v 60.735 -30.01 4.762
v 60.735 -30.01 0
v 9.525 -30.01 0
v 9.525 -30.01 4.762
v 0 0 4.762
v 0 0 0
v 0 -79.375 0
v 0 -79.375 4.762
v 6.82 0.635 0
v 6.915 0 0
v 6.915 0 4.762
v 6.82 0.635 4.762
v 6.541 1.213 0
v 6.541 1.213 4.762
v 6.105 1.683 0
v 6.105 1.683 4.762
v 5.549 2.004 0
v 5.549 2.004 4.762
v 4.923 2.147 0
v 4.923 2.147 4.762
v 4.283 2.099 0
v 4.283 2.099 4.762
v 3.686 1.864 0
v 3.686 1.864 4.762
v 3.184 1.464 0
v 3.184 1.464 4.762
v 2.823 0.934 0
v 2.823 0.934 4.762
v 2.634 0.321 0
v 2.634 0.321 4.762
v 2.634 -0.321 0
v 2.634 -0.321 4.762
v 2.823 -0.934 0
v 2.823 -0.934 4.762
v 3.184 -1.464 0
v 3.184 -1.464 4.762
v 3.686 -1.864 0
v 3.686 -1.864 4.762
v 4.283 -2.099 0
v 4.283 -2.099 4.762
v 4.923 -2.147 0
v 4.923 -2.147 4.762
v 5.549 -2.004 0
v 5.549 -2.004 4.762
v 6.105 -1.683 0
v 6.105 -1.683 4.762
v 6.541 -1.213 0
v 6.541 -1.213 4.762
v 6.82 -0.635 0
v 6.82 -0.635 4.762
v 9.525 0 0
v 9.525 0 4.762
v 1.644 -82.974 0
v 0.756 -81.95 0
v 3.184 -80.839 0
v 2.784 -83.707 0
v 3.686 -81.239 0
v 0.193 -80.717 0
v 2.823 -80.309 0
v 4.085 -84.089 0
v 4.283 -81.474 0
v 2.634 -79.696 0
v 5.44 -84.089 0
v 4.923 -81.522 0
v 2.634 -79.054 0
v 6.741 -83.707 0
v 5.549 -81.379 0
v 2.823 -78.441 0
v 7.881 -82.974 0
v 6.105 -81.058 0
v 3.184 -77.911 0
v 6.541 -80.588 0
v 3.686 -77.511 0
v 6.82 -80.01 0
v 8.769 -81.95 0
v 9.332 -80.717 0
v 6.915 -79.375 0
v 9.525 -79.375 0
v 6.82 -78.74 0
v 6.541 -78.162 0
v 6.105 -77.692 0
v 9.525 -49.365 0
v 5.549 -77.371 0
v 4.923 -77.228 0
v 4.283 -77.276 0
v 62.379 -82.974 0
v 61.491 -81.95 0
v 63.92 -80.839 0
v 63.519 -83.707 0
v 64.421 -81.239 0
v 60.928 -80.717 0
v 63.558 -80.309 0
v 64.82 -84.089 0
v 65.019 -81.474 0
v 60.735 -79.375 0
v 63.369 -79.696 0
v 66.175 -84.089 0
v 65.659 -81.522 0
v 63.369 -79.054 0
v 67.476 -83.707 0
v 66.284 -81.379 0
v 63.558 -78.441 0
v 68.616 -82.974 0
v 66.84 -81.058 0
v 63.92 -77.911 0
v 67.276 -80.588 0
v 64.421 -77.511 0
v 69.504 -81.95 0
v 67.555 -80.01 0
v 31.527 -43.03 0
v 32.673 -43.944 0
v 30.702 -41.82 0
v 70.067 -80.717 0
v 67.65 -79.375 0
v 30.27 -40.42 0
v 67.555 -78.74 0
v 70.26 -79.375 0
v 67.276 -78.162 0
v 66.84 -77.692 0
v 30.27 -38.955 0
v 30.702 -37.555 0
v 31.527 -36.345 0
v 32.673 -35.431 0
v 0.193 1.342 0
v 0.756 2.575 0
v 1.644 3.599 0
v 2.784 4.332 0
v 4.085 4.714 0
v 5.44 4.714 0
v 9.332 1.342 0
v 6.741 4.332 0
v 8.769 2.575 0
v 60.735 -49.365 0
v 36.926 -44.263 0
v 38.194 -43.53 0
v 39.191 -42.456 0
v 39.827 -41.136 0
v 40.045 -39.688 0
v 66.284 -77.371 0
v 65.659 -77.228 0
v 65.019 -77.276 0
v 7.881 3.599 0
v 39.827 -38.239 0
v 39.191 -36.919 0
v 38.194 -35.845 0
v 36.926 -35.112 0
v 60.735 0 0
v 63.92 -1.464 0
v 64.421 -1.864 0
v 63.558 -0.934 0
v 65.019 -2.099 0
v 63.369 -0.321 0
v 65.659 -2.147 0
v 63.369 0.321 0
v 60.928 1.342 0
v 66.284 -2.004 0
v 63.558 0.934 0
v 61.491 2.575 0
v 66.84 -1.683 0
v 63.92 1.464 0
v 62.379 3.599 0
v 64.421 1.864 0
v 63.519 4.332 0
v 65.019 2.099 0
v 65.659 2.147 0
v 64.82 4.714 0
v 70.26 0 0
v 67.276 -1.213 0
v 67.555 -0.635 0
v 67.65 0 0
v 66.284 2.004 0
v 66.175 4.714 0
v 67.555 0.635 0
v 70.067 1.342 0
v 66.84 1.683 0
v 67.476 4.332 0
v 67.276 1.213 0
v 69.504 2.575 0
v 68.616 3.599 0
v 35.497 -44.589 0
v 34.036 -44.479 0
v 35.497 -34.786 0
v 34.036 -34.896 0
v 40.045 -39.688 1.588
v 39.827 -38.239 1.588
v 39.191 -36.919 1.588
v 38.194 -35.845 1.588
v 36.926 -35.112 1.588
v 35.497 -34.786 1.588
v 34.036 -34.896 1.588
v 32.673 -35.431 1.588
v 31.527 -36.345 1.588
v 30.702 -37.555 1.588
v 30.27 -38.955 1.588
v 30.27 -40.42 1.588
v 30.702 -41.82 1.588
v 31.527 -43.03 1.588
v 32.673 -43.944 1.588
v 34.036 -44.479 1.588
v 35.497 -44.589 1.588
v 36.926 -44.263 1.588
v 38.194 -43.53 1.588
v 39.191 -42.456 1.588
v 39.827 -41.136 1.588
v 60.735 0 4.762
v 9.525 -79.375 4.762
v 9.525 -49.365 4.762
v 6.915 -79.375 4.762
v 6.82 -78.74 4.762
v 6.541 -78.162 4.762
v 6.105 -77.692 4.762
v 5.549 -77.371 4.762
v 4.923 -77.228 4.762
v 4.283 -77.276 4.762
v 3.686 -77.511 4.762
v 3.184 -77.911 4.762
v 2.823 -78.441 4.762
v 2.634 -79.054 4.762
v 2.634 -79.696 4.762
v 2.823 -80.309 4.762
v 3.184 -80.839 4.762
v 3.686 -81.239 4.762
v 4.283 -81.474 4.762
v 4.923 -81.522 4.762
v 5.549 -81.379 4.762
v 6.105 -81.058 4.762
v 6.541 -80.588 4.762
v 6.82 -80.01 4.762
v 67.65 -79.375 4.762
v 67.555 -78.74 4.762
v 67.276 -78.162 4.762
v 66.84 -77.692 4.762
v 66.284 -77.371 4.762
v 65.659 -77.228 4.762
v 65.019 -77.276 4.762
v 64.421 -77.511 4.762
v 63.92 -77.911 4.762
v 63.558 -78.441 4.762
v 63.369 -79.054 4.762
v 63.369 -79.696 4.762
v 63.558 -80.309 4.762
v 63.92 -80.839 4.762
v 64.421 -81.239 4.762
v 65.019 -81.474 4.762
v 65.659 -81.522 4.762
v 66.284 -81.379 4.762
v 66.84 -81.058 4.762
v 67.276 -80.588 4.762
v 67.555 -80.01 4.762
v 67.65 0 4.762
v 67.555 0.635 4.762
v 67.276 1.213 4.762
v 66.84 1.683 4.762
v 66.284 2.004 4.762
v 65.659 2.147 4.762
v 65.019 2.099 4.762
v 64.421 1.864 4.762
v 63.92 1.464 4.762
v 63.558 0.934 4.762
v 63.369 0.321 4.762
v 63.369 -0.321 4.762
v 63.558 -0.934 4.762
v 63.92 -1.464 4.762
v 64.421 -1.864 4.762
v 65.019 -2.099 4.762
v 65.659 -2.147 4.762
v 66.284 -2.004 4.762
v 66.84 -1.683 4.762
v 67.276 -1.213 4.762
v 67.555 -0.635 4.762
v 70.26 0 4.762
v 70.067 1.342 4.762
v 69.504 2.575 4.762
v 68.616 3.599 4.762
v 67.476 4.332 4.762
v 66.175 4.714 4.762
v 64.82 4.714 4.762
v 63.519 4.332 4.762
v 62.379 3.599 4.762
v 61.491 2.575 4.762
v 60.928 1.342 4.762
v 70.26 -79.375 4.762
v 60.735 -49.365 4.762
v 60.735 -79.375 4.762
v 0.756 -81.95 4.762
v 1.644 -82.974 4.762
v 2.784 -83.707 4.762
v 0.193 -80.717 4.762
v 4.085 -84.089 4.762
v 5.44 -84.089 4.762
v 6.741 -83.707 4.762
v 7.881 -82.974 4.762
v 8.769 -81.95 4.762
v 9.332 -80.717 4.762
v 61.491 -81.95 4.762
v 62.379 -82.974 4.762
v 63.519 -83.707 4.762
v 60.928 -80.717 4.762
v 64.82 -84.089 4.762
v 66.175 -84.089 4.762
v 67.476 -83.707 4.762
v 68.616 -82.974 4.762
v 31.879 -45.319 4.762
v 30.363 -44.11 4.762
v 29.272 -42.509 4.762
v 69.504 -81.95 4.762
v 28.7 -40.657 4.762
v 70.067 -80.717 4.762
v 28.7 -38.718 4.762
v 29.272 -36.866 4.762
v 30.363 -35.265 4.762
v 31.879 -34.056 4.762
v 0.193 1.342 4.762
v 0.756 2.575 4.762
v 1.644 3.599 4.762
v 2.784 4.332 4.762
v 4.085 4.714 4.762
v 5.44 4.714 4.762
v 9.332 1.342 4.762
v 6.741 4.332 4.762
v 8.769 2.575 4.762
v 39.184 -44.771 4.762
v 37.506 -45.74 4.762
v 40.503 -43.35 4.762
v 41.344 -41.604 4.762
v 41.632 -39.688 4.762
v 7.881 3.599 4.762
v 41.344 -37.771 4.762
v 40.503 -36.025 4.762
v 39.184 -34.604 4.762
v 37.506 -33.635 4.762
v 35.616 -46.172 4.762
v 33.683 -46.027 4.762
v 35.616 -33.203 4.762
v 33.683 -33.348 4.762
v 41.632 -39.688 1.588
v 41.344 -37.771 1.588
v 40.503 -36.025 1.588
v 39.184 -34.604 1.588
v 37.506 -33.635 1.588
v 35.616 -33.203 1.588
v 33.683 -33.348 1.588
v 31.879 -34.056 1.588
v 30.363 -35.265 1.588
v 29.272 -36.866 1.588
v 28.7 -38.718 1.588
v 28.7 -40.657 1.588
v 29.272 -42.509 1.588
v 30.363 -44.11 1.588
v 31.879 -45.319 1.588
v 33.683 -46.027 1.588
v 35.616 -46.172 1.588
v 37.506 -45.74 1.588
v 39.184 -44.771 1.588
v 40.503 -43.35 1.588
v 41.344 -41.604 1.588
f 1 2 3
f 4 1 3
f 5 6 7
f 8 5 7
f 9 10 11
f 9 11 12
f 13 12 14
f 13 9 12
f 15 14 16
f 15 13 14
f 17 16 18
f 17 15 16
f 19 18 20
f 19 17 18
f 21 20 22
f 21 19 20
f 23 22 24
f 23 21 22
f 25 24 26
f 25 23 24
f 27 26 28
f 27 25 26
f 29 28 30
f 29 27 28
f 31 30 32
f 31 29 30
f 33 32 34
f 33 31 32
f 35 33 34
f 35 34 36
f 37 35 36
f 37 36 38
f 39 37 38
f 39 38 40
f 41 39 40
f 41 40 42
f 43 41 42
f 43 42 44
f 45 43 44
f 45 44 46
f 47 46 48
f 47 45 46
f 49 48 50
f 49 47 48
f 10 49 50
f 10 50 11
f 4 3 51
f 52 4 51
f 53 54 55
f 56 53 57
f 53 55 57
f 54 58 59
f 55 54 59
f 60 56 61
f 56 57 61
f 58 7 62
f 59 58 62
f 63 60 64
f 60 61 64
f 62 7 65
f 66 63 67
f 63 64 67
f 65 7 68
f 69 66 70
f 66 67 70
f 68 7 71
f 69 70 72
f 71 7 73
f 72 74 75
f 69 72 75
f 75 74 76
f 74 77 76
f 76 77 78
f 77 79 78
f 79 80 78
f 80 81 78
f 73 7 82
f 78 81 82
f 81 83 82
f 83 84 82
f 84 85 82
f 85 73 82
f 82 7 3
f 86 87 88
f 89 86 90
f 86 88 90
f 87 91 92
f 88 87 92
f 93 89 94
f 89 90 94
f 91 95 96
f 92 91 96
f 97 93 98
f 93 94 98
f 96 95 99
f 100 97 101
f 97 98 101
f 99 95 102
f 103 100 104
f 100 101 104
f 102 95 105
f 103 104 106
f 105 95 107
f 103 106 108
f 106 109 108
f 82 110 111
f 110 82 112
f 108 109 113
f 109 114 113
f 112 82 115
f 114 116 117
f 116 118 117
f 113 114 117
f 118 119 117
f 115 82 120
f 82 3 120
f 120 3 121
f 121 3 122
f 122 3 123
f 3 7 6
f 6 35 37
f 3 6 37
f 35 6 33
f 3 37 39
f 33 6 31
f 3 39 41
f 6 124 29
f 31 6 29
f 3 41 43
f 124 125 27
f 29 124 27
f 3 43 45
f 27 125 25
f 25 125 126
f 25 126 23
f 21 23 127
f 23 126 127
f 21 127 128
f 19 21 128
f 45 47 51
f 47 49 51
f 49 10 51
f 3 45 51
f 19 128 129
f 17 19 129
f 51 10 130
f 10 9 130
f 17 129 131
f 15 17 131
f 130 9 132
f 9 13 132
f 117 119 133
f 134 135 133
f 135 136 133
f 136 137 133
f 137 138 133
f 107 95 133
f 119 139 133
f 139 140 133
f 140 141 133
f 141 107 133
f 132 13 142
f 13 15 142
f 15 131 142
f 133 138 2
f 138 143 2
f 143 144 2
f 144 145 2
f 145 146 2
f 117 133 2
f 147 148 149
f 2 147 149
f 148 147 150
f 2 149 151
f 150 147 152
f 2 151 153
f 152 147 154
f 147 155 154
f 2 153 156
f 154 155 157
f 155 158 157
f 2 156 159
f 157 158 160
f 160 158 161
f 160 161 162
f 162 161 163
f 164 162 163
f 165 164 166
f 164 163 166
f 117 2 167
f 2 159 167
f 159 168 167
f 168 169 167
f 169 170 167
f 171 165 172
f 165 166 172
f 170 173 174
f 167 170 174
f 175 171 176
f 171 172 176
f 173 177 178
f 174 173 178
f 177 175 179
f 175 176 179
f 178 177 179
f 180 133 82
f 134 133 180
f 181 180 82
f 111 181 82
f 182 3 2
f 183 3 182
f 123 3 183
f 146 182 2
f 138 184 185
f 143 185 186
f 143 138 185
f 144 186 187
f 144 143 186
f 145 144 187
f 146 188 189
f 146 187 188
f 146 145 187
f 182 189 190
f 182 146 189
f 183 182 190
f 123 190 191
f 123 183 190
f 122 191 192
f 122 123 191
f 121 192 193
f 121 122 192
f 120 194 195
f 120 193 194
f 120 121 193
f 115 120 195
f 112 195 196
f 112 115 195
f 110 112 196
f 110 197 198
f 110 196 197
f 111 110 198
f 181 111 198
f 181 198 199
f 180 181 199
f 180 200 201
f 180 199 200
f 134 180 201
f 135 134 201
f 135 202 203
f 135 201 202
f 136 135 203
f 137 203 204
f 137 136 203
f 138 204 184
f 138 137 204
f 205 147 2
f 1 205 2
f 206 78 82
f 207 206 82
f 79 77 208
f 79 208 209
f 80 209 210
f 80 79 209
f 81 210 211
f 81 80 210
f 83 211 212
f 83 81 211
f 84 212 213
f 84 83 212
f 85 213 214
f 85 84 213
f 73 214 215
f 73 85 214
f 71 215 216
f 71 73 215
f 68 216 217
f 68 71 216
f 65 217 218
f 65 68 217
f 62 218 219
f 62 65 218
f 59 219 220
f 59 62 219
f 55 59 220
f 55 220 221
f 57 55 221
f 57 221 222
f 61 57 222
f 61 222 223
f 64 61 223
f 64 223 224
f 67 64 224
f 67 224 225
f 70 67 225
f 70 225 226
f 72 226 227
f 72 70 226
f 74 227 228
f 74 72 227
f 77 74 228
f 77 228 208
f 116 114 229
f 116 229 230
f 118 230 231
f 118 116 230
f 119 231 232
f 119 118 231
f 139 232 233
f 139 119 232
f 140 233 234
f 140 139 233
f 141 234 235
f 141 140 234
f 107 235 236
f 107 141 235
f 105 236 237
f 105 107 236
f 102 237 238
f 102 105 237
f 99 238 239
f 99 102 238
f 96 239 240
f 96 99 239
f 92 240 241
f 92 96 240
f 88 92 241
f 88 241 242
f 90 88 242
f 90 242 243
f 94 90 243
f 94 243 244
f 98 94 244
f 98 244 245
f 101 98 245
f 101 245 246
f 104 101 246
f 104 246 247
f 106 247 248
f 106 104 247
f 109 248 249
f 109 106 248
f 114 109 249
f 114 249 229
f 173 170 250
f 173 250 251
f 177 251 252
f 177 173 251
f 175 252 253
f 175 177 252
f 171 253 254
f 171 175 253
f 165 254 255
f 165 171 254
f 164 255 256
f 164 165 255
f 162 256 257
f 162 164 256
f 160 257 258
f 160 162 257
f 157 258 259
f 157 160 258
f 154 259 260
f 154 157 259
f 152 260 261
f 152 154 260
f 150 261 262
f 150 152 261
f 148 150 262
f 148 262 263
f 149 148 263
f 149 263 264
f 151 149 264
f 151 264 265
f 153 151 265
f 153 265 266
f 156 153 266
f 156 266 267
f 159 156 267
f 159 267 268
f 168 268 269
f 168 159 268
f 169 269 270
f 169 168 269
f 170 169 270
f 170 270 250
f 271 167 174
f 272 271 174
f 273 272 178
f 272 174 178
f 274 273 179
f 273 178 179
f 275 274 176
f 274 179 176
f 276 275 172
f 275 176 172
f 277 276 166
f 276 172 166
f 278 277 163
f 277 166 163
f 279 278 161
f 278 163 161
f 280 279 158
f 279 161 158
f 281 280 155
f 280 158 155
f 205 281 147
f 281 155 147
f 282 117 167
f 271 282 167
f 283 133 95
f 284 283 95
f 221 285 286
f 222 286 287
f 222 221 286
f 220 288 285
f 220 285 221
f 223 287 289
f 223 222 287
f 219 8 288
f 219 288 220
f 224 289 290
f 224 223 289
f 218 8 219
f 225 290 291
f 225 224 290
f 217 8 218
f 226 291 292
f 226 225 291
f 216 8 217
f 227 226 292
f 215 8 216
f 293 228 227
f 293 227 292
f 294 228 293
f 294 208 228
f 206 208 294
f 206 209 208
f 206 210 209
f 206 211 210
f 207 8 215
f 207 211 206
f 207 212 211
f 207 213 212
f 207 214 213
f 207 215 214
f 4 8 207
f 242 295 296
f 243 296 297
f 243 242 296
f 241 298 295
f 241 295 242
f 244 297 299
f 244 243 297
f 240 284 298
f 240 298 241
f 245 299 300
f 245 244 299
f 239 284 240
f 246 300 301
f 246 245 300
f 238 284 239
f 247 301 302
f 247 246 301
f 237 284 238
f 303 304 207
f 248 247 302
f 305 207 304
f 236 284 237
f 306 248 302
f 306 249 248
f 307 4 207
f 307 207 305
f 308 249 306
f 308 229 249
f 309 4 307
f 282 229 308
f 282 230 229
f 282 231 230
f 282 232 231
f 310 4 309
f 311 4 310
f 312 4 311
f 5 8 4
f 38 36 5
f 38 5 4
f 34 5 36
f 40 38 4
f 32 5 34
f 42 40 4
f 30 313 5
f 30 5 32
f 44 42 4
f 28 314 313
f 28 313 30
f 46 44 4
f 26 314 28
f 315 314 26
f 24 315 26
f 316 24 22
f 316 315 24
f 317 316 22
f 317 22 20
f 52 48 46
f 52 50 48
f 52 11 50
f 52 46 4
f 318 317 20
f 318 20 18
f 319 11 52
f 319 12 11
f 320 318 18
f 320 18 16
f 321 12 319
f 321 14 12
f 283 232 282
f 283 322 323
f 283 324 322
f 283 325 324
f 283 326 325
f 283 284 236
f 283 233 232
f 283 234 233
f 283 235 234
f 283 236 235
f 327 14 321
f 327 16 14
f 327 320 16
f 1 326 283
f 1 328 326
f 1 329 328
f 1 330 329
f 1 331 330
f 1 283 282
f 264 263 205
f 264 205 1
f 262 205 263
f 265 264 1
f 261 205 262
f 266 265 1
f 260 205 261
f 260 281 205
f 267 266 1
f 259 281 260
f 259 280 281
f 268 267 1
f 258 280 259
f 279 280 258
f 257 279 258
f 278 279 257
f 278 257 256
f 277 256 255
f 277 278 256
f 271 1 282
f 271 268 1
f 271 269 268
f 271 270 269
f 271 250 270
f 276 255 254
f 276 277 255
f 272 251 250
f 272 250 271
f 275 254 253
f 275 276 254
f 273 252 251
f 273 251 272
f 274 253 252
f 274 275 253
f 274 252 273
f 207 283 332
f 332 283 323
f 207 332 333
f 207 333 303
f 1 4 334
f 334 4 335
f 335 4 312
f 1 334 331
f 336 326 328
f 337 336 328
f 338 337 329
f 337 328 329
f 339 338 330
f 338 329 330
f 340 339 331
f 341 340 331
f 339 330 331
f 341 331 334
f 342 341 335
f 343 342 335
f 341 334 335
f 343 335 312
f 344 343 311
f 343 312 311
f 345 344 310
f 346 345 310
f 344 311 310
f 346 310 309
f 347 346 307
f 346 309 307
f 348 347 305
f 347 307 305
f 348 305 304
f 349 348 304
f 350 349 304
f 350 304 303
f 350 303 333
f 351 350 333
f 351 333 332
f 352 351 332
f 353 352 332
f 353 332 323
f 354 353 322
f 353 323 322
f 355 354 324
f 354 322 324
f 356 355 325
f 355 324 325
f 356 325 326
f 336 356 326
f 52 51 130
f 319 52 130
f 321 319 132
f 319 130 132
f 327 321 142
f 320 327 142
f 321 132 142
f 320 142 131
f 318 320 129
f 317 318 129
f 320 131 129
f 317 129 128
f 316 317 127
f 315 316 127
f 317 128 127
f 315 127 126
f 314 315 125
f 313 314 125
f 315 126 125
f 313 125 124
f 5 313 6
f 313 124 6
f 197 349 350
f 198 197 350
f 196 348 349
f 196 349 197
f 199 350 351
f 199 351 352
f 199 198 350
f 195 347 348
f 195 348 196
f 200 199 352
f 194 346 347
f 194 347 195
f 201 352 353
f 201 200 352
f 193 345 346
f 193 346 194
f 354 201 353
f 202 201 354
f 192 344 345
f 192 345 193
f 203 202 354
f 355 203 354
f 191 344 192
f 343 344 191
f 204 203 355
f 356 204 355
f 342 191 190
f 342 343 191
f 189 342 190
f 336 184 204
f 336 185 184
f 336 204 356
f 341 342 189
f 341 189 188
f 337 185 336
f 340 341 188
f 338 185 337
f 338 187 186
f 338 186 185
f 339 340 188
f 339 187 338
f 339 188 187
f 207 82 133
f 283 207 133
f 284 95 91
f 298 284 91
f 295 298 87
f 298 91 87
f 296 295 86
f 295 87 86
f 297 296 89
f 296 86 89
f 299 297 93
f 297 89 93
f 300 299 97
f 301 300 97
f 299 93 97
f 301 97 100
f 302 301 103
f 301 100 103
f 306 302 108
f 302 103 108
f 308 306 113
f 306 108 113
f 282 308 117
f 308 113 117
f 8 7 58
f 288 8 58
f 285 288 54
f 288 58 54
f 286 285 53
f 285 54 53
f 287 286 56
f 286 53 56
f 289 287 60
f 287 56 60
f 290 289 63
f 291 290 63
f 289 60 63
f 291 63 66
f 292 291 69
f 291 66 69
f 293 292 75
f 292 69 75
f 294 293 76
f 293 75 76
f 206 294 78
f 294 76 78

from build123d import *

# Parameters (mm, degrees)
F0_R     = 2.15265
F0_R_2   = 4.9149
F1_DEPTH = 4.7625
F2_R     = 6.5024
F3_DEPTH = 3.175


with BuildPart() as f1:
    # F0 (on Top) → F1 (new body)
    with BuildSketch(Plane.XY):
        with BuildLine():
            ThreePointArc((9.525, 0), (4.7625, 4.7625), (0, 0))
            Line((0, 0), (0, -79.375))
            ThreePointArc((0, -79.375), (4.7625, -84.1375), (9.525, -79.375))
            Line((9.525, -79.375), (9.525, -49.3649))
            Line((9.525, -49.3649), (60.735159, -49.3649))
            Line((60.735159, -49.3649), (60.735159, -79.375))
            ThreePointArc((60.735159, -79.375), (65.497659, -84.1375), (70.260159, -79.375))
            Line((70.260159, -79.375), (70.260159, 0))
            ThreePointArc((70.260159, 0), (65.497659, 4.7625), (60.735159, 0))
            Line((60.735159, 0), (60.735159, -30.0101))
            Line((60.735159, -30.0101), (9.525, -30.0101))
            Line((9.525, -30.0101), (9.525, 0))
        make_face()
        with Locations((4.7625, -79.375)):
            Circle(F0_R, mode=Mode.SUBTRACT)
        with Locations((65.497659, -79.375)):
            Circle(F0_R, mode=Mode.SUBTRACT)
        with Locations((4.7625, 0)):
            Circle(F0_R, mode=Mode.SUBTRACT)
        with Locations((35.13008, -39.6875)):
            Circle(F0_R_2, mode=Mode.SUBTRACT)
        with Locations((65.497659, 0)):
            Circle(F0_R, mode=Mode.SUBTRACT)
    extrude(amount=F1_DEPTH)

    # F2 (on face) → F3 (cut)
    with BuildSketch(Plane.XY.offset(4.7625)):
        with Locations((35.13008, -39.6875)):
            Circle(F2_R)
    extrude(amount=-F3_DEPTH, mode=Mode.SUBTRACT)


solid = f1.part
